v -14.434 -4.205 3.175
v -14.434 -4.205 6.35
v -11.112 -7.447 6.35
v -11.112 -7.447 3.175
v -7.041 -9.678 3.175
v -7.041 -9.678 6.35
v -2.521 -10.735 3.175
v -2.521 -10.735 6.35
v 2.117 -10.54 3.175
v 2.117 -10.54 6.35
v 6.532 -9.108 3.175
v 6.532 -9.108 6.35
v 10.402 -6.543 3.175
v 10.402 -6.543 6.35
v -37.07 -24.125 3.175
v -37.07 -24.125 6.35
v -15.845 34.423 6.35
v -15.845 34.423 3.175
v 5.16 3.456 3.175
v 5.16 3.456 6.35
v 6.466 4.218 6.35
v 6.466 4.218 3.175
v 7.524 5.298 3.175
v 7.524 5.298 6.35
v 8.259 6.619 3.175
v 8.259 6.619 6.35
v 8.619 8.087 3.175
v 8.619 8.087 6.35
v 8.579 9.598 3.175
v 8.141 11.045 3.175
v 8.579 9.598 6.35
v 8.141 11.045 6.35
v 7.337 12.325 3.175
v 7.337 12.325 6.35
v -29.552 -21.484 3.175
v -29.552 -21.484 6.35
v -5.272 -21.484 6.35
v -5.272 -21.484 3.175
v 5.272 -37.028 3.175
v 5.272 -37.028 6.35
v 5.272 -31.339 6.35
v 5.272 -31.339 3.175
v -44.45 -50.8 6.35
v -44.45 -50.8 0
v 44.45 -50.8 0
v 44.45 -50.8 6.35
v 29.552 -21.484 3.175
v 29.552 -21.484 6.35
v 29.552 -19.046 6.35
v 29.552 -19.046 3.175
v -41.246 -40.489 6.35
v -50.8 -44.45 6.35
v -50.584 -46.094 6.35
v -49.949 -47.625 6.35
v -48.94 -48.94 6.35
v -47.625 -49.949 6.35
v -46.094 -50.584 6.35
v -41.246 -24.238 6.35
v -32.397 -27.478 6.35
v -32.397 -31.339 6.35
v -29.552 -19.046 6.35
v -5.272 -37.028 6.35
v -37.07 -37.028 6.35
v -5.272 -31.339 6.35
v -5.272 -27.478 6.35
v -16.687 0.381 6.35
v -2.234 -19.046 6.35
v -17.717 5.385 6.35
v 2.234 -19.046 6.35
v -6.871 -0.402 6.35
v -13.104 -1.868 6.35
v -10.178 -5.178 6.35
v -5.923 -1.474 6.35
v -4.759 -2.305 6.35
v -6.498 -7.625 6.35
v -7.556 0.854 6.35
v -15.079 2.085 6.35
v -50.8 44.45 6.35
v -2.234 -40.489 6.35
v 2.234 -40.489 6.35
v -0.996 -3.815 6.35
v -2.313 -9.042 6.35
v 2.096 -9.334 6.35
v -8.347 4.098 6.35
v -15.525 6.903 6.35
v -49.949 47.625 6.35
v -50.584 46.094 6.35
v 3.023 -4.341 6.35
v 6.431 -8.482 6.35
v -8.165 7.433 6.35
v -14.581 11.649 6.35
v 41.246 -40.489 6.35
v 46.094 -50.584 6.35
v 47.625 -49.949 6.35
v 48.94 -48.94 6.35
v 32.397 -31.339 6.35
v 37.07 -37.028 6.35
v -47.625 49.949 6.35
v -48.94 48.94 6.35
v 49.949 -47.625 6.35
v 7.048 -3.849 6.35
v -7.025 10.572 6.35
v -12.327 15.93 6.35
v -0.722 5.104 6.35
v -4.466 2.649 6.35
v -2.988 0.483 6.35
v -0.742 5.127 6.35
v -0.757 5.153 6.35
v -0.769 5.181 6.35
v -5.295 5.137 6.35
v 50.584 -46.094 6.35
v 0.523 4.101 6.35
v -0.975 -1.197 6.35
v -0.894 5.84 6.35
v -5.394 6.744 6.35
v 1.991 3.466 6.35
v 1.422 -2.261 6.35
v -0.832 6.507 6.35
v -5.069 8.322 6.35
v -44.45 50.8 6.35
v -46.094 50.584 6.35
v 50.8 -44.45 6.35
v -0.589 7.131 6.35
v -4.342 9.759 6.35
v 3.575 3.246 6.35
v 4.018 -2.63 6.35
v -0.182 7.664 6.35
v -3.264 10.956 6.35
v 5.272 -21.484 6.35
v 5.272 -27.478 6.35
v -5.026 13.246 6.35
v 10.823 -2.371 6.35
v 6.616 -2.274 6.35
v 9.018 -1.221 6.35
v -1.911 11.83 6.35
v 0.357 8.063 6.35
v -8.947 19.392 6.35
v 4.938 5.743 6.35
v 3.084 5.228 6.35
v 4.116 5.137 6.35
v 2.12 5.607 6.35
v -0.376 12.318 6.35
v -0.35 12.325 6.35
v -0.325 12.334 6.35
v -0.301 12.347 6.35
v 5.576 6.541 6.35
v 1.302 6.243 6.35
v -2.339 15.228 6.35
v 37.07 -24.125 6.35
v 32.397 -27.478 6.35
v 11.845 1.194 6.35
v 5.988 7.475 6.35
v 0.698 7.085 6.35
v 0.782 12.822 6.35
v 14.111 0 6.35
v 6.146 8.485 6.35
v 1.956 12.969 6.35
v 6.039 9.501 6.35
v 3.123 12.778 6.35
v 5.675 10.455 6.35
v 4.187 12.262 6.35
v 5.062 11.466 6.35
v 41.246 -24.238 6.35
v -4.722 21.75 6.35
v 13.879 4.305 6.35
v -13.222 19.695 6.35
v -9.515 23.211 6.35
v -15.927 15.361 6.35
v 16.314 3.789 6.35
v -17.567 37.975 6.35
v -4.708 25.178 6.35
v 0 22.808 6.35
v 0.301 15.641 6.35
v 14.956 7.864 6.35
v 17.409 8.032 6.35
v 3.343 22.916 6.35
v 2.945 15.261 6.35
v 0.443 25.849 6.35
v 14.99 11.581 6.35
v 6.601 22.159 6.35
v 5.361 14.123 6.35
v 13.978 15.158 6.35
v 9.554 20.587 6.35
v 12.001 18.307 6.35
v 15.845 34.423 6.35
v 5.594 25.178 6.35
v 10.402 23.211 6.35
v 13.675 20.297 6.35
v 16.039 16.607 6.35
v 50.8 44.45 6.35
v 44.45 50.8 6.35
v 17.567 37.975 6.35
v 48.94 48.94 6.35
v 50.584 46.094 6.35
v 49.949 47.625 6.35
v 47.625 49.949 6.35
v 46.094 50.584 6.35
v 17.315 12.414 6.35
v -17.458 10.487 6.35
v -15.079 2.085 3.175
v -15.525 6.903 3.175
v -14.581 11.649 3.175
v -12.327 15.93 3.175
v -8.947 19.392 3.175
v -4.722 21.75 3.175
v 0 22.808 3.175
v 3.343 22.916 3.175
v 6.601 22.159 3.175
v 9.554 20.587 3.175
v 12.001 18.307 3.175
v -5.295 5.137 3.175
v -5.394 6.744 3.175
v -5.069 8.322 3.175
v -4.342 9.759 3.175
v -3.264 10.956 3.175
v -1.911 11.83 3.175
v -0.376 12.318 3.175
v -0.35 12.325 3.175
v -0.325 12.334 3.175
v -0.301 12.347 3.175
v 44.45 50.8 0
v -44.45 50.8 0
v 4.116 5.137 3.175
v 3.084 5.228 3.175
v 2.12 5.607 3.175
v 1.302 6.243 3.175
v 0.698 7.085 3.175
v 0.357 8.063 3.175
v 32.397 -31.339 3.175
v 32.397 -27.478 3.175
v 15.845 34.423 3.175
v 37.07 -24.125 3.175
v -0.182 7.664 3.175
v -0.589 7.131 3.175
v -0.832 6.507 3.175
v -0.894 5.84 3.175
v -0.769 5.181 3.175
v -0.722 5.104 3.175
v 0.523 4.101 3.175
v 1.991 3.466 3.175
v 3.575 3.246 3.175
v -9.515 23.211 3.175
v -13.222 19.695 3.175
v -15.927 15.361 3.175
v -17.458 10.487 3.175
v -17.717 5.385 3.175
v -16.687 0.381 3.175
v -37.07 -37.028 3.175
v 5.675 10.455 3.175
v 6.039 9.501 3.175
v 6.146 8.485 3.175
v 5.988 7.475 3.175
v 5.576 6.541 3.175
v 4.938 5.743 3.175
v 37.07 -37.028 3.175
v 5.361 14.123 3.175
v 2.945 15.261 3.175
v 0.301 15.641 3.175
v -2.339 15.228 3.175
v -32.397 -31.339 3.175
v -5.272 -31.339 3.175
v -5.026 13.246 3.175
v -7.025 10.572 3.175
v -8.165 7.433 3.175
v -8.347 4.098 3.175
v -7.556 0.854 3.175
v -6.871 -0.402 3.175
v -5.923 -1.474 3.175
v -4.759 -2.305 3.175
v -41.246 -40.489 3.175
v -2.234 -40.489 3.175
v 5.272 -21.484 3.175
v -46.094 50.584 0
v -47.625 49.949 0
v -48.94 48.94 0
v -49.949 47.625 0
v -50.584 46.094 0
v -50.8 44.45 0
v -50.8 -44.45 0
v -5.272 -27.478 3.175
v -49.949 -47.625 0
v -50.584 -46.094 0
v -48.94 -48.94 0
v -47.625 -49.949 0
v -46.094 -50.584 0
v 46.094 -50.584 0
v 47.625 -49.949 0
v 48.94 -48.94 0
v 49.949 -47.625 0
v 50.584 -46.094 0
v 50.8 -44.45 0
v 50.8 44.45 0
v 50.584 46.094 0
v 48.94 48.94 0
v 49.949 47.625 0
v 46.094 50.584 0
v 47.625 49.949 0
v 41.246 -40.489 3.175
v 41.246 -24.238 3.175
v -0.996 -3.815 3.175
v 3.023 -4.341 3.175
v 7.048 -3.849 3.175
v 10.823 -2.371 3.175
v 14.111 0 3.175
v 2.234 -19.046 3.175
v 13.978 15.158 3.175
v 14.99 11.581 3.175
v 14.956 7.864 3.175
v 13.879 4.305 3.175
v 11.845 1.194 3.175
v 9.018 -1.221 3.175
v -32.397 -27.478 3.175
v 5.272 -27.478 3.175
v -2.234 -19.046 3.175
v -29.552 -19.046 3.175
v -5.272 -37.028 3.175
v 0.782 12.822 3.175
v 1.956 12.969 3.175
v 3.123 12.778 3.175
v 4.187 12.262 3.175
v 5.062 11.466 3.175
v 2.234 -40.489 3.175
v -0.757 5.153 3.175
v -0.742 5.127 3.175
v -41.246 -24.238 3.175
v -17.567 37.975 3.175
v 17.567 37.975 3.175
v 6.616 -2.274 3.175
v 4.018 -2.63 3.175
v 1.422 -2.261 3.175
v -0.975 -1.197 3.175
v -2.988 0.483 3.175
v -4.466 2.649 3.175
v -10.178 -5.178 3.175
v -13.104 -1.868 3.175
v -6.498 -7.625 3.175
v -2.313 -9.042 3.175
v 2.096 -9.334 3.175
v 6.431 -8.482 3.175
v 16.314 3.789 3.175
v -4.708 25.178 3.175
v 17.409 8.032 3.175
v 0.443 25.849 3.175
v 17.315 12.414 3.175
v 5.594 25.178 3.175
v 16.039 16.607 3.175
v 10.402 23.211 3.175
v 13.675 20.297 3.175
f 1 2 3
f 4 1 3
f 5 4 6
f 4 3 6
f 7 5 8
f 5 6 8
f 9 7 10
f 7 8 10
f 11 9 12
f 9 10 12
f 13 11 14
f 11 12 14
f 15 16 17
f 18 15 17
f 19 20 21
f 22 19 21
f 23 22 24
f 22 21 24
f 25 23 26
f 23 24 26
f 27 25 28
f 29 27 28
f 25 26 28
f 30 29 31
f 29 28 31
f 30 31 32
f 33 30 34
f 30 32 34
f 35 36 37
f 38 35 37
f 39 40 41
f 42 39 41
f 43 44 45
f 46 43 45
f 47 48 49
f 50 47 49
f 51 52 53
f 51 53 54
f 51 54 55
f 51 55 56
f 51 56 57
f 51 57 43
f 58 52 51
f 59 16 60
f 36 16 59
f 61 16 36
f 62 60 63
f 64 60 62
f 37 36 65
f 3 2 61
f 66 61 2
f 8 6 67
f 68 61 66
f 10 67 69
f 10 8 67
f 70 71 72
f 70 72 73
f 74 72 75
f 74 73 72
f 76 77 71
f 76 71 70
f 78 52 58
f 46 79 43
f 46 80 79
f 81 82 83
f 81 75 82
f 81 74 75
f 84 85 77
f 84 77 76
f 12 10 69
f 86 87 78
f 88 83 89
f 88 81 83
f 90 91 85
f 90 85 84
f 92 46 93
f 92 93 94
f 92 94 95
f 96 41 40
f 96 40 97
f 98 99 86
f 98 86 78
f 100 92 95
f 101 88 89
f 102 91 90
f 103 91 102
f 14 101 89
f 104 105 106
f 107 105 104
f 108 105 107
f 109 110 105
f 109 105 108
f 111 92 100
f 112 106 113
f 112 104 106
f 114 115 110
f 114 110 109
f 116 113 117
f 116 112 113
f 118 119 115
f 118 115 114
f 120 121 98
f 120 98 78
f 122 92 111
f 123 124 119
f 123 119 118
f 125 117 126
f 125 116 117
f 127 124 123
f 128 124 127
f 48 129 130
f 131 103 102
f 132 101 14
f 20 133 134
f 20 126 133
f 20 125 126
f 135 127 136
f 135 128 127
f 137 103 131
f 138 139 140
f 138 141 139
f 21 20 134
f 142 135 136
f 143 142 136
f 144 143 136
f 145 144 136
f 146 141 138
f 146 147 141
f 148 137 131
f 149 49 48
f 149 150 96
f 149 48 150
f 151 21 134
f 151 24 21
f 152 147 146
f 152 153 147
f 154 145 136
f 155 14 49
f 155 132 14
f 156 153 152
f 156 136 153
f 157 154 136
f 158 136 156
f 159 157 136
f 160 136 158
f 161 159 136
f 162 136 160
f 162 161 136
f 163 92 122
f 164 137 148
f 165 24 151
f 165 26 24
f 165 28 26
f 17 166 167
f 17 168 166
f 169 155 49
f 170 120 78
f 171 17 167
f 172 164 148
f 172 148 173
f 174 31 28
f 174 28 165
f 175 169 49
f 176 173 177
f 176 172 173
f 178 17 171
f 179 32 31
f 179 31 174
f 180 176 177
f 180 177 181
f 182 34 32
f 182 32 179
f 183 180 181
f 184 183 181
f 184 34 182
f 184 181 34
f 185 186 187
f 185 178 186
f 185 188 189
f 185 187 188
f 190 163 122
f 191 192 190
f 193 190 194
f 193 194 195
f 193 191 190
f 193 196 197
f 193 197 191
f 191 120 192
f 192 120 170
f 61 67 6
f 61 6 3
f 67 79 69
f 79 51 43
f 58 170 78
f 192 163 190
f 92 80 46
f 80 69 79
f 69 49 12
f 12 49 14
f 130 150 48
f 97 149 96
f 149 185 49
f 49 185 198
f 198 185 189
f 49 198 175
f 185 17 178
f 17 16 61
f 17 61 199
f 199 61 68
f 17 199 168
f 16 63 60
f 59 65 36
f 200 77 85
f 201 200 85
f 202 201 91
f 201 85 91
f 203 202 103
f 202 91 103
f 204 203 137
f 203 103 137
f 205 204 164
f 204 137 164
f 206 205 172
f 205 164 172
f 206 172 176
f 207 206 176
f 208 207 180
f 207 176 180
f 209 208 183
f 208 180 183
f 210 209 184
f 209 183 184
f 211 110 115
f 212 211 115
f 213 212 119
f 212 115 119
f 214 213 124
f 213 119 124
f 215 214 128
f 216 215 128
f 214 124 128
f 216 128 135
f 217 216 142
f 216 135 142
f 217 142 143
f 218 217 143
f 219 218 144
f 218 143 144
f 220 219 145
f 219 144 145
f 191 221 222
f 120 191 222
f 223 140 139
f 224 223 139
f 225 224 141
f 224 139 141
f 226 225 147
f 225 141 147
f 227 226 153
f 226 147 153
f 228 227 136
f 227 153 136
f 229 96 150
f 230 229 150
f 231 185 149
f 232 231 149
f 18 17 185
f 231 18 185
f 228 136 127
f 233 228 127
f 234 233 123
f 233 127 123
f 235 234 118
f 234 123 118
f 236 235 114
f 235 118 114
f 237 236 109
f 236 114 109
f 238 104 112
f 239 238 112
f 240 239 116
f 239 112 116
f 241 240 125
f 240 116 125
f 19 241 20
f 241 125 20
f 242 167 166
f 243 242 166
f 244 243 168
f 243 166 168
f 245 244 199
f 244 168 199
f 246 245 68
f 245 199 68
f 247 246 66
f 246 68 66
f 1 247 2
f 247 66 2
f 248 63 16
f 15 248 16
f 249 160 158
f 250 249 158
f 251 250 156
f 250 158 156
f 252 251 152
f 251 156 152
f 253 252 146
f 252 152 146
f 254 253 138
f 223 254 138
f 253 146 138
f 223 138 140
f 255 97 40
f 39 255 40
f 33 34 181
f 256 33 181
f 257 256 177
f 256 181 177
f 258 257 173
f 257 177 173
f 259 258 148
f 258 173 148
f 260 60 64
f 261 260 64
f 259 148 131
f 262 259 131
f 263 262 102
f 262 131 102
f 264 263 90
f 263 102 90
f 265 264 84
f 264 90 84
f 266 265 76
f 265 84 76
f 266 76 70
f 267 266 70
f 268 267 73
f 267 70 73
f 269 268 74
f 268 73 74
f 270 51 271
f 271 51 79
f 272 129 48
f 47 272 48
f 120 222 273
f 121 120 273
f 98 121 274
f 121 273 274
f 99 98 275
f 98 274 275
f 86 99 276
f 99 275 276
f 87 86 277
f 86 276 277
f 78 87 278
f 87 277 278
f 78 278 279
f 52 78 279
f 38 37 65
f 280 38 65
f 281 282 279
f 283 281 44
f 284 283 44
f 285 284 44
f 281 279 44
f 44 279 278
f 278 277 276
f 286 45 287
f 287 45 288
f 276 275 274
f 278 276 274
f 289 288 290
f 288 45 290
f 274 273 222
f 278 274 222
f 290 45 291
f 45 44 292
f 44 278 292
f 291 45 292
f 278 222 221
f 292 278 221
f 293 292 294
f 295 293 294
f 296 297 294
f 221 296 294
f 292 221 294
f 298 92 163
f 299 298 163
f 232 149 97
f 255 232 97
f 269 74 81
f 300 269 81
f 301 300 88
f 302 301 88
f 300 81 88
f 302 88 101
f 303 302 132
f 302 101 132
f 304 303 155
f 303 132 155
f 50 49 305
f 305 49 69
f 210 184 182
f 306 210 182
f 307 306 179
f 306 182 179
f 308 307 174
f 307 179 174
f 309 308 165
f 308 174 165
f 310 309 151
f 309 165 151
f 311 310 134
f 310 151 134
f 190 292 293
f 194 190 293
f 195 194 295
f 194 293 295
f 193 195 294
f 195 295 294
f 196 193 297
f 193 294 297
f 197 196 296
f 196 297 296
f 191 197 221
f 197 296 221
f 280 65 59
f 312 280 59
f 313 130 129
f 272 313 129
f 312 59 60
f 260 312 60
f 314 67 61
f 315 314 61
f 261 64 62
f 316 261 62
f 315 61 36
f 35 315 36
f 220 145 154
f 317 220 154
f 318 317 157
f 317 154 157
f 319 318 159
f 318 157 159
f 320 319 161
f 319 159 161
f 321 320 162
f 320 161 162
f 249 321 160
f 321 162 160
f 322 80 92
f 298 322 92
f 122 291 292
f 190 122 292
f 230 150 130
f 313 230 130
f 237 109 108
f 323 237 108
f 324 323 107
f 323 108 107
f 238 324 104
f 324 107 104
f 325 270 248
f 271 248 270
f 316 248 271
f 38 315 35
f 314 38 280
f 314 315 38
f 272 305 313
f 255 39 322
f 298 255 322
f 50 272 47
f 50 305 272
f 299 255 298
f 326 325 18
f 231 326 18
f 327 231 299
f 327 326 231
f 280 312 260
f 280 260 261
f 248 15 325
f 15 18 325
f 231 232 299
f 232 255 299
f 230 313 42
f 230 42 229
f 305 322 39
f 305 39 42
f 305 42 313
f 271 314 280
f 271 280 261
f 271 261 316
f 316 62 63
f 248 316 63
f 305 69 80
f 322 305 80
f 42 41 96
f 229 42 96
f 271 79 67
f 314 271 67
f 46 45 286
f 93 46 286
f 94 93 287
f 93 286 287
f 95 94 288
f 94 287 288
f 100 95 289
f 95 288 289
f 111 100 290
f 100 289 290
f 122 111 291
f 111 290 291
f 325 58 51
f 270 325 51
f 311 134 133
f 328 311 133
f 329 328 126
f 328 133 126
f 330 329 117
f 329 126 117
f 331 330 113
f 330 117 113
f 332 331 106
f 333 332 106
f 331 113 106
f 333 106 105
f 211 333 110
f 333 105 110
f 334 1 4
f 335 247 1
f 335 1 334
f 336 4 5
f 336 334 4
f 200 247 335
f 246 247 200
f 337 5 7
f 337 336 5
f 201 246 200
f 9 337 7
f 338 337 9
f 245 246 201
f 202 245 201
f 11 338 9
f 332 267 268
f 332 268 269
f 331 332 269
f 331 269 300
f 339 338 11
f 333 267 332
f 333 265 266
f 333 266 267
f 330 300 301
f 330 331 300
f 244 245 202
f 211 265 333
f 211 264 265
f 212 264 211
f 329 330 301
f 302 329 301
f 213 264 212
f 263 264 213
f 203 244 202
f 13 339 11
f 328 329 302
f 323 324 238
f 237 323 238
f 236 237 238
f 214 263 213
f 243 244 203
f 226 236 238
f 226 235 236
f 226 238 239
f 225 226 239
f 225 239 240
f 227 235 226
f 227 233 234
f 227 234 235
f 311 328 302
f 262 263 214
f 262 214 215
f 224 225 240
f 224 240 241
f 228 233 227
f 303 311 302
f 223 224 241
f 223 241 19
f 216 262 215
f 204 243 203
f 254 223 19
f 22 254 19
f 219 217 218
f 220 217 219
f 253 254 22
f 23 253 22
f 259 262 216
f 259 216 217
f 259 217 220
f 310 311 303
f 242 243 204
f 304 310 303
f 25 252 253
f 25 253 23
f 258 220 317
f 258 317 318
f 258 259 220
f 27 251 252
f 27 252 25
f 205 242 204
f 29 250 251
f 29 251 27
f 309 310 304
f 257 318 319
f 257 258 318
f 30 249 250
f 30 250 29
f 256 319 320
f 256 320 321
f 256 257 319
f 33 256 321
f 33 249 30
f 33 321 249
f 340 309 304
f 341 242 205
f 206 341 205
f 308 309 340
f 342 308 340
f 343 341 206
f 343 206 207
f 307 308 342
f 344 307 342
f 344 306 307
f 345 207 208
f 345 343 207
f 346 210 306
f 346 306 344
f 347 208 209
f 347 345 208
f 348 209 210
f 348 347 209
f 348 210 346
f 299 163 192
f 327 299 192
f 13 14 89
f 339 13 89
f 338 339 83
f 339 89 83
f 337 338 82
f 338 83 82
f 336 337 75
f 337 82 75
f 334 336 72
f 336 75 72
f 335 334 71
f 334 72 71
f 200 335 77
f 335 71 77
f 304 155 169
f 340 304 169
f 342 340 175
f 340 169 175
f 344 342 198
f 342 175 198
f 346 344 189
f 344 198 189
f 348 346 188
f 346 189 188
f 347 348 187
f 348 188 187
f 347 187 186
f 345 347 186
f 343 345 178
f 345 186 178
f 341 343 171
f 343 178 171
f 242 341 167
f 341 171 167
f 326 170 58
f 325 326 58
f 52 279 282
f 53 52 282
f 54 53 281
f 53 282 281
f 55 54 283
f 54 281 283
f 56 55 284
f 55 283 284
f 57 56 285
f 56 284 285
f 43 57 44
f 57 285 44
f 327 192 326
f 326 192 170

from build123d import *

# Parameters (mm, degrees)
F1_DEPTH = 6.35
F3_DEPTH = 3.175


with BuildPart() as f1:
    # F0 (on Top) → F1 (new body)
    with BuildSketch(Plane.XY):
        with BuildLine():
            Line((44.45, 50.8), (-44.45, 50.8))
            ThreePointArc((-44.45, 50.8), (-48.940128, 48.940128), (-50.8, 44.45))
            Line((-50.8, 44.45), (-50.8, -44.45))
            ThreePointArc((-50.8, -44.45), (-48.940128, -48.940128), (-44.45, -50.8))
            Line((-44.45, -50.8), (44.45, -50.8))
            ThreePointArc((44.45, -50.8), (48.940128, -48.940128), (50.8, -44.45))
            Line((50.8, -44.45), (50.8, 44.45))
            ThreePointArc((50.8, 44.45), (48.940128, 48.940128), (44.45, 50.8))
        make_face()
    extrude(amount=F1_DEPTH)

    # F2 (on face) → F3 (cut)
    with BuildSketch(Plane.XY.offset(6.35)):
        Polygon((-2.234112, -19.045804), (-29.552355, -19.045804), (-29.552355, -21.484036), (-5.271634, -21.484036), (-5.271634, -27.478021), (-32.396957, -27.478021), (-32.396957, -31.338554), (-5.271634, -31.338554), (-5.271634, -37.027761), (-37.070233, -37.027761), (-37.070233, -24.125453), (-15.844628, 34.422915), (0, 34.422915), (15.844628, 34.422915), (37.070233, -24.125453), (37.070233, -37.027761), (5.271634, -37.027761), (5.271634, -31.338554), (32.396957, -31.338554), (32.396957, -27.478021), (5.271634, -27.478021), (5.271634, -21.484036), (29.552355, -21.484036), (29.552355, -19.045804), (2.234112, -19.045804), (2.234112, -40.488526), (41.246254, -40.488526), (41.246254, -24.237618), (17.566774, 37.974838), (0, 37.974838), (-17.566774, 37.974838), (-41.246254, -24.237618), (-41.246254, -40.488526), (-2.234112, -40.488526), align=None)
        with BuildLine():
            ThreePointArc((-9.515172, 23.211), (-17.458093, 10.48697), (-14.43387, -4.204695))
            ThreePointArc((-14.43387, -4.204695), (-2.520981, -10.7353), (10.401524, -6.543092))
            ThreePointArc((10.401524, -6.543092), (-4.451794, -8.46966), (-15.078945, 2.084788))
            ThreePointArc((-15.078945, 2.084788), (-12.326603, 15.929623), (0, 22.807829))
            ThreePointArc((0, 22.807829), (6.601318, 22.159177), (12.001306, 18.307129))
            ThreePointArc((12.001306, 18.307129), (14.956093, 7.863629), (9.017832, -1.221222))
            ThreePointArc((9.017832, -1.221222), (0.186781, -1.812212), (-5.294772, 5.136839))
            ThreePointArc((-5.294772, 5.136839), (-4.342036, 9.759367), (-0.376268, 12.318302))
            ThreePointArc((-0.376268, 12.318302), (-0.337375, 12.329109), (-0.301231, 12.347085))
            ThreePointArc((-0.301231, 12.347085), (3.122709, 12.777502), (5.674904, 10.454805))
            ThreePointArc((5.674904, 10.454805), (5.988125, 7.475454), (4.115821, 5.136839))
            ThreePointArc((4.115821, 5.136839), (1.688211, 5.89567), (0.35678, 8.062788))
            ThreePointArc((0.35678, 8.062788), (-0.732404, 6.827583), (-0.7692, 5.181162))
            ThreePointArc((-0.7692, 5.181162), (-0.749973, 5.13983), (-0.722364, 5.103558))
            ThreePointArc((-0.722364, 5.103558), (1.991164, 3.466413), (5.160289, 3.455573))
            ThreePointArc((5.160289, 3.455573), (8.487959, 7.340866), (7.337417, 12.325357))
            ThreePointArc((7.337417, 12.325357), (2.944683, 15.261206), (-2.33871, 15.228196))
            ThreePointArc((-2.33871, 15.228196), (-7.7104, 9.043988), (-7.555628, 0.854024))
            ThreePointArc((-7.555628, 0.854024), (-6.427229, -0.964786), (-4.758632, -2.305359))
            ThreePointArc((-4.758632, -2.305359), (5.051029, -4.221989), (14.110706, 0))
            ThreePointArc((14.110706, 0), (17.314869, 12.413903), (10.401524, 23.211))
            ThreePointArc((10.401524, 23.211), (0.443176, 25.849161), (-9.515172, 23.211))
        make_face()
    extrude(amount=-F3_DEPTH, mode=Mode.SUBTRACT)


solid = f1.part
